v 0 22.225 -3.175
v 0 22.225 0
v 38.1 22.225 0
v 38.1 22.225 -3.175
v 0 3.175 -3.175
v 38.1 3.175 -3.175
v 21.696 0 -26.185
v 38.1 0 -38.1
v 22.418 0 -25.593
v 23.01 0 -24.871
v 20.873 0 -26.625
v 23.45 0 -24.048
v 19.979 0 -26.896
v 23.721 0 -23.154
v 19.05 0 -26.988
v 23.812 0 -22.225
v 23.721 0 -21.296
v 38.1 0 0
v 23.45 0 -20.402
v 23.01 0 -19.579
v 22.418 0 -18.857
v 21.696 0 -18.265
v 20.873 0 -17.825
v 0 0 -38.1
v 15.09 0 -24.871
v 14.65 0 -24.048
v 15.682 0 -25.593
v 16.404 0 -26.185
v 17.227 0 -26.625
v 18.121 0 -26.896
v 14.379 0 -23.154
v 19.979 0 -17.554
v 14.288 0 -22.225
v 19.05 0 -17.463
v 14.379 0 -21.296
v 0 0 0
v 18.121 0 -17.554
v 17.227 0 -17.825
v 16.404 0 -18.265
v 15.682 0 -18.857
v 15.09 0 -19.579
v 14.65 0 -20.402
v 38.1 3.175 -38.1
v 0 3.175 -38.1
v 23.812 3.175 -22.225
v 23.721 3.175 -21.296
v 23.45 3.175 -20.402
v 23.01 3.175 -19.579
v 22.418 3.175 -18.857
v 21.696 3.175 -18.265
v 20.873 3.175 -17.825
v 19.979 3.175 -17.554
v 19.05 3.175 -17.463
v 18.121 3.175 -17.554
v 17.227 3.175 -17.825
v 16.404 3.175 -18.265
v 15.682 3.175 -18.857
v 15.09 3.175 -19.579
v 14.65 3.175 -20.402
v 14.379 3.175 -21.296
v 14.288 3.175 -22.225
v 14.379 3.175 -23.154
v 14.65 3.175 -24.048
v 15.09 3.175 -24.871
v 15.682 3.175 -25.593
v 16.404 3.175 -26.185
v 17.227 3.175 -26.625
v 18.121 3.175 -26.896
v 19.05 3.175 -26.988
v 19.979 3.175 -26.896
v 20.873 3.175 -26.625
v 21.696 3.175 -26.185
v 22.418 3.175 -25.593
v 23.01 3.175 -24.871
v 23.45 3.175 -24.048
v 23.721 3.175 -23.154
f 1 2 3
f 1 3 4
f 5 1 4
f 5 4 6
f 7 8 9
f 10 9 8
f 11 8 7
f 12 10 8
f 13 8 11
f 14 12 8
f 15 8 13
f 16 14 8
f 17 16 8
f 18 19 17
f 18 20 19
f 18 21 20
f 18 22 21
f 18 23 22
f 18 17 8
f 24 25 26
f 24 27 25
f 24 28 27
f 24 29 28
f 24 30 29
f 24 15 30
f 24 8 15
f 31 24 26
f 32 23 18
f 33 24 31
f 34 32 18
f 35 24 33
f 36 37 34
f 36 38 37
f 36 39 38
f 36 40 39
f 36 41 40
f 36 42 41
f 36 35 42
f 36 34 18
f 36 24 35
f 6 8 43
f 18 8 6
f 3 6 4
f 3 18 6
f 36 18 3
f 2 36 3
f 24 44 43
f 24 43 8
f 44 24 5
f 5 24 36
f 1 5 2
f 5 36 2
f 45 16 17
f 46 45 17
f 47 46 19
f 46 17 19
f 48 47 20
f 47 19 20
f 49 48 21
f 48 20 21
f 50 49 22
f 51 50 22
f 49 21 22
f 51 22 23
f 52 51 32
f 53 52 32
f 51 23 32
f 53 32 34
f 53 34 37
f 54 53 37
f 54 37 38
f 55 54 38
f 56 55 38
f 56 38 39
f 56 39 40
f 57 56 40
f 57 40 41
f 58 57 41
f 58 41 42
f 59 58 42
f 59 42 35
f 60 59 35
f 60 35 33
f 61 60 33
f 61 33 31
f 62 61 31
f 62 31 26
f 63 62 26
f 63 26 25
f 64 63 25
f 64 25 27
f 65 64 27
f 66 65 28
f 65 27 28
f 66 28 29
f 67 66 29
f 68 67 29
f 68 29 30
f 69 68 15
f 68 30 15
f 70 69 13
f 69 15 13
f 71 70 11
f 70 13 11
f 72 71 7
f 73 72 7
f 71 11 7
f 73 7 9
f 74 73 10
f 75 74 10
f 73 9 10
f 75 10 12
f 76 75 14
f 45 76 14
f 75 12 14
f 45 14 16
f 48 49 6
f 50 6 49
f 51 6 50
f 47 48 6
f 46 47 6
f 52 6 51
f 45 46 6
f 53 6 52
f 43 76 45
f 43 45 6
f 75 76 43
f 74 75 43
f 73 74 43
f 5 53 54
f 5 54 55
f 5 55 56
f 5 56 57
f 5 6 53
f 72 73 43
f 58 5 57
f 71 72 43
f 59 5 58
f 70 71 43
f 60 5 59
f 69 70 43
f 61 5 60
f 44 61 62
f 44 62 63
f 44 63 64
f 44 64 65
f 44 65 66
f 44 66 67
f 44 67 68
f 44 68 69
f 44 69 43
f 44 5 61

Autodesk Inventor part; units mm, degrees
ref_plane "YZ Plane" through (0, 0, 0) normal (1, 0, 0) x (0, 1, 0)
ref_plane "XZ Plane" through (0, 0, 0) normal (0, 1, 0) x (-1, 0, 0)
ref_plane "XY Plane" through (0, 0, 0) normal (0, 0, 1) x (1, 0, 0)
sketch "Sketch1" plane through (0, 0, 0) normal (1, 0, 0) x (0, 1, 0)
  line L0 (0, 0) -> (22.225, 0)
  line L1 (22.225, 0) -> (22.225, -3.175)
  line L2 (22.225, -3.175) -> (3.175, -3.175)
  line L3 (3.175, -3.175) -> (3.175, -38.1)
  line L4 (3.175, -38.1) -> (0, -38.1)
  line L5 (0, -38.1) -> (0, 0)
  dimension "d0" = 22.225
  dimension "d1" = 3.175
  dimension "d4" = 38.1
extrude "Extrusion1" add sketch "Sketch1" along normal blind 38.1
sketch "Sketch2" plane through (0, 0, -38.1) normal (0, -1, 0) x (1, 0, 0)
  circle A0 centre (19.05, 15.875) radius 4.7625
  line L0 (38.1, 38.1) -> (38.1, 0) projected
  point P0 (0, 38.1)
  dimension "d5" = 9.525
  dimension "d6" = 22.225
  dimension "d7" = 19.05
extrude "Extrusion2" cut sketch "Sketch2" against normal through all
properties part number "angle bracket" material "Aluminum 6061"
